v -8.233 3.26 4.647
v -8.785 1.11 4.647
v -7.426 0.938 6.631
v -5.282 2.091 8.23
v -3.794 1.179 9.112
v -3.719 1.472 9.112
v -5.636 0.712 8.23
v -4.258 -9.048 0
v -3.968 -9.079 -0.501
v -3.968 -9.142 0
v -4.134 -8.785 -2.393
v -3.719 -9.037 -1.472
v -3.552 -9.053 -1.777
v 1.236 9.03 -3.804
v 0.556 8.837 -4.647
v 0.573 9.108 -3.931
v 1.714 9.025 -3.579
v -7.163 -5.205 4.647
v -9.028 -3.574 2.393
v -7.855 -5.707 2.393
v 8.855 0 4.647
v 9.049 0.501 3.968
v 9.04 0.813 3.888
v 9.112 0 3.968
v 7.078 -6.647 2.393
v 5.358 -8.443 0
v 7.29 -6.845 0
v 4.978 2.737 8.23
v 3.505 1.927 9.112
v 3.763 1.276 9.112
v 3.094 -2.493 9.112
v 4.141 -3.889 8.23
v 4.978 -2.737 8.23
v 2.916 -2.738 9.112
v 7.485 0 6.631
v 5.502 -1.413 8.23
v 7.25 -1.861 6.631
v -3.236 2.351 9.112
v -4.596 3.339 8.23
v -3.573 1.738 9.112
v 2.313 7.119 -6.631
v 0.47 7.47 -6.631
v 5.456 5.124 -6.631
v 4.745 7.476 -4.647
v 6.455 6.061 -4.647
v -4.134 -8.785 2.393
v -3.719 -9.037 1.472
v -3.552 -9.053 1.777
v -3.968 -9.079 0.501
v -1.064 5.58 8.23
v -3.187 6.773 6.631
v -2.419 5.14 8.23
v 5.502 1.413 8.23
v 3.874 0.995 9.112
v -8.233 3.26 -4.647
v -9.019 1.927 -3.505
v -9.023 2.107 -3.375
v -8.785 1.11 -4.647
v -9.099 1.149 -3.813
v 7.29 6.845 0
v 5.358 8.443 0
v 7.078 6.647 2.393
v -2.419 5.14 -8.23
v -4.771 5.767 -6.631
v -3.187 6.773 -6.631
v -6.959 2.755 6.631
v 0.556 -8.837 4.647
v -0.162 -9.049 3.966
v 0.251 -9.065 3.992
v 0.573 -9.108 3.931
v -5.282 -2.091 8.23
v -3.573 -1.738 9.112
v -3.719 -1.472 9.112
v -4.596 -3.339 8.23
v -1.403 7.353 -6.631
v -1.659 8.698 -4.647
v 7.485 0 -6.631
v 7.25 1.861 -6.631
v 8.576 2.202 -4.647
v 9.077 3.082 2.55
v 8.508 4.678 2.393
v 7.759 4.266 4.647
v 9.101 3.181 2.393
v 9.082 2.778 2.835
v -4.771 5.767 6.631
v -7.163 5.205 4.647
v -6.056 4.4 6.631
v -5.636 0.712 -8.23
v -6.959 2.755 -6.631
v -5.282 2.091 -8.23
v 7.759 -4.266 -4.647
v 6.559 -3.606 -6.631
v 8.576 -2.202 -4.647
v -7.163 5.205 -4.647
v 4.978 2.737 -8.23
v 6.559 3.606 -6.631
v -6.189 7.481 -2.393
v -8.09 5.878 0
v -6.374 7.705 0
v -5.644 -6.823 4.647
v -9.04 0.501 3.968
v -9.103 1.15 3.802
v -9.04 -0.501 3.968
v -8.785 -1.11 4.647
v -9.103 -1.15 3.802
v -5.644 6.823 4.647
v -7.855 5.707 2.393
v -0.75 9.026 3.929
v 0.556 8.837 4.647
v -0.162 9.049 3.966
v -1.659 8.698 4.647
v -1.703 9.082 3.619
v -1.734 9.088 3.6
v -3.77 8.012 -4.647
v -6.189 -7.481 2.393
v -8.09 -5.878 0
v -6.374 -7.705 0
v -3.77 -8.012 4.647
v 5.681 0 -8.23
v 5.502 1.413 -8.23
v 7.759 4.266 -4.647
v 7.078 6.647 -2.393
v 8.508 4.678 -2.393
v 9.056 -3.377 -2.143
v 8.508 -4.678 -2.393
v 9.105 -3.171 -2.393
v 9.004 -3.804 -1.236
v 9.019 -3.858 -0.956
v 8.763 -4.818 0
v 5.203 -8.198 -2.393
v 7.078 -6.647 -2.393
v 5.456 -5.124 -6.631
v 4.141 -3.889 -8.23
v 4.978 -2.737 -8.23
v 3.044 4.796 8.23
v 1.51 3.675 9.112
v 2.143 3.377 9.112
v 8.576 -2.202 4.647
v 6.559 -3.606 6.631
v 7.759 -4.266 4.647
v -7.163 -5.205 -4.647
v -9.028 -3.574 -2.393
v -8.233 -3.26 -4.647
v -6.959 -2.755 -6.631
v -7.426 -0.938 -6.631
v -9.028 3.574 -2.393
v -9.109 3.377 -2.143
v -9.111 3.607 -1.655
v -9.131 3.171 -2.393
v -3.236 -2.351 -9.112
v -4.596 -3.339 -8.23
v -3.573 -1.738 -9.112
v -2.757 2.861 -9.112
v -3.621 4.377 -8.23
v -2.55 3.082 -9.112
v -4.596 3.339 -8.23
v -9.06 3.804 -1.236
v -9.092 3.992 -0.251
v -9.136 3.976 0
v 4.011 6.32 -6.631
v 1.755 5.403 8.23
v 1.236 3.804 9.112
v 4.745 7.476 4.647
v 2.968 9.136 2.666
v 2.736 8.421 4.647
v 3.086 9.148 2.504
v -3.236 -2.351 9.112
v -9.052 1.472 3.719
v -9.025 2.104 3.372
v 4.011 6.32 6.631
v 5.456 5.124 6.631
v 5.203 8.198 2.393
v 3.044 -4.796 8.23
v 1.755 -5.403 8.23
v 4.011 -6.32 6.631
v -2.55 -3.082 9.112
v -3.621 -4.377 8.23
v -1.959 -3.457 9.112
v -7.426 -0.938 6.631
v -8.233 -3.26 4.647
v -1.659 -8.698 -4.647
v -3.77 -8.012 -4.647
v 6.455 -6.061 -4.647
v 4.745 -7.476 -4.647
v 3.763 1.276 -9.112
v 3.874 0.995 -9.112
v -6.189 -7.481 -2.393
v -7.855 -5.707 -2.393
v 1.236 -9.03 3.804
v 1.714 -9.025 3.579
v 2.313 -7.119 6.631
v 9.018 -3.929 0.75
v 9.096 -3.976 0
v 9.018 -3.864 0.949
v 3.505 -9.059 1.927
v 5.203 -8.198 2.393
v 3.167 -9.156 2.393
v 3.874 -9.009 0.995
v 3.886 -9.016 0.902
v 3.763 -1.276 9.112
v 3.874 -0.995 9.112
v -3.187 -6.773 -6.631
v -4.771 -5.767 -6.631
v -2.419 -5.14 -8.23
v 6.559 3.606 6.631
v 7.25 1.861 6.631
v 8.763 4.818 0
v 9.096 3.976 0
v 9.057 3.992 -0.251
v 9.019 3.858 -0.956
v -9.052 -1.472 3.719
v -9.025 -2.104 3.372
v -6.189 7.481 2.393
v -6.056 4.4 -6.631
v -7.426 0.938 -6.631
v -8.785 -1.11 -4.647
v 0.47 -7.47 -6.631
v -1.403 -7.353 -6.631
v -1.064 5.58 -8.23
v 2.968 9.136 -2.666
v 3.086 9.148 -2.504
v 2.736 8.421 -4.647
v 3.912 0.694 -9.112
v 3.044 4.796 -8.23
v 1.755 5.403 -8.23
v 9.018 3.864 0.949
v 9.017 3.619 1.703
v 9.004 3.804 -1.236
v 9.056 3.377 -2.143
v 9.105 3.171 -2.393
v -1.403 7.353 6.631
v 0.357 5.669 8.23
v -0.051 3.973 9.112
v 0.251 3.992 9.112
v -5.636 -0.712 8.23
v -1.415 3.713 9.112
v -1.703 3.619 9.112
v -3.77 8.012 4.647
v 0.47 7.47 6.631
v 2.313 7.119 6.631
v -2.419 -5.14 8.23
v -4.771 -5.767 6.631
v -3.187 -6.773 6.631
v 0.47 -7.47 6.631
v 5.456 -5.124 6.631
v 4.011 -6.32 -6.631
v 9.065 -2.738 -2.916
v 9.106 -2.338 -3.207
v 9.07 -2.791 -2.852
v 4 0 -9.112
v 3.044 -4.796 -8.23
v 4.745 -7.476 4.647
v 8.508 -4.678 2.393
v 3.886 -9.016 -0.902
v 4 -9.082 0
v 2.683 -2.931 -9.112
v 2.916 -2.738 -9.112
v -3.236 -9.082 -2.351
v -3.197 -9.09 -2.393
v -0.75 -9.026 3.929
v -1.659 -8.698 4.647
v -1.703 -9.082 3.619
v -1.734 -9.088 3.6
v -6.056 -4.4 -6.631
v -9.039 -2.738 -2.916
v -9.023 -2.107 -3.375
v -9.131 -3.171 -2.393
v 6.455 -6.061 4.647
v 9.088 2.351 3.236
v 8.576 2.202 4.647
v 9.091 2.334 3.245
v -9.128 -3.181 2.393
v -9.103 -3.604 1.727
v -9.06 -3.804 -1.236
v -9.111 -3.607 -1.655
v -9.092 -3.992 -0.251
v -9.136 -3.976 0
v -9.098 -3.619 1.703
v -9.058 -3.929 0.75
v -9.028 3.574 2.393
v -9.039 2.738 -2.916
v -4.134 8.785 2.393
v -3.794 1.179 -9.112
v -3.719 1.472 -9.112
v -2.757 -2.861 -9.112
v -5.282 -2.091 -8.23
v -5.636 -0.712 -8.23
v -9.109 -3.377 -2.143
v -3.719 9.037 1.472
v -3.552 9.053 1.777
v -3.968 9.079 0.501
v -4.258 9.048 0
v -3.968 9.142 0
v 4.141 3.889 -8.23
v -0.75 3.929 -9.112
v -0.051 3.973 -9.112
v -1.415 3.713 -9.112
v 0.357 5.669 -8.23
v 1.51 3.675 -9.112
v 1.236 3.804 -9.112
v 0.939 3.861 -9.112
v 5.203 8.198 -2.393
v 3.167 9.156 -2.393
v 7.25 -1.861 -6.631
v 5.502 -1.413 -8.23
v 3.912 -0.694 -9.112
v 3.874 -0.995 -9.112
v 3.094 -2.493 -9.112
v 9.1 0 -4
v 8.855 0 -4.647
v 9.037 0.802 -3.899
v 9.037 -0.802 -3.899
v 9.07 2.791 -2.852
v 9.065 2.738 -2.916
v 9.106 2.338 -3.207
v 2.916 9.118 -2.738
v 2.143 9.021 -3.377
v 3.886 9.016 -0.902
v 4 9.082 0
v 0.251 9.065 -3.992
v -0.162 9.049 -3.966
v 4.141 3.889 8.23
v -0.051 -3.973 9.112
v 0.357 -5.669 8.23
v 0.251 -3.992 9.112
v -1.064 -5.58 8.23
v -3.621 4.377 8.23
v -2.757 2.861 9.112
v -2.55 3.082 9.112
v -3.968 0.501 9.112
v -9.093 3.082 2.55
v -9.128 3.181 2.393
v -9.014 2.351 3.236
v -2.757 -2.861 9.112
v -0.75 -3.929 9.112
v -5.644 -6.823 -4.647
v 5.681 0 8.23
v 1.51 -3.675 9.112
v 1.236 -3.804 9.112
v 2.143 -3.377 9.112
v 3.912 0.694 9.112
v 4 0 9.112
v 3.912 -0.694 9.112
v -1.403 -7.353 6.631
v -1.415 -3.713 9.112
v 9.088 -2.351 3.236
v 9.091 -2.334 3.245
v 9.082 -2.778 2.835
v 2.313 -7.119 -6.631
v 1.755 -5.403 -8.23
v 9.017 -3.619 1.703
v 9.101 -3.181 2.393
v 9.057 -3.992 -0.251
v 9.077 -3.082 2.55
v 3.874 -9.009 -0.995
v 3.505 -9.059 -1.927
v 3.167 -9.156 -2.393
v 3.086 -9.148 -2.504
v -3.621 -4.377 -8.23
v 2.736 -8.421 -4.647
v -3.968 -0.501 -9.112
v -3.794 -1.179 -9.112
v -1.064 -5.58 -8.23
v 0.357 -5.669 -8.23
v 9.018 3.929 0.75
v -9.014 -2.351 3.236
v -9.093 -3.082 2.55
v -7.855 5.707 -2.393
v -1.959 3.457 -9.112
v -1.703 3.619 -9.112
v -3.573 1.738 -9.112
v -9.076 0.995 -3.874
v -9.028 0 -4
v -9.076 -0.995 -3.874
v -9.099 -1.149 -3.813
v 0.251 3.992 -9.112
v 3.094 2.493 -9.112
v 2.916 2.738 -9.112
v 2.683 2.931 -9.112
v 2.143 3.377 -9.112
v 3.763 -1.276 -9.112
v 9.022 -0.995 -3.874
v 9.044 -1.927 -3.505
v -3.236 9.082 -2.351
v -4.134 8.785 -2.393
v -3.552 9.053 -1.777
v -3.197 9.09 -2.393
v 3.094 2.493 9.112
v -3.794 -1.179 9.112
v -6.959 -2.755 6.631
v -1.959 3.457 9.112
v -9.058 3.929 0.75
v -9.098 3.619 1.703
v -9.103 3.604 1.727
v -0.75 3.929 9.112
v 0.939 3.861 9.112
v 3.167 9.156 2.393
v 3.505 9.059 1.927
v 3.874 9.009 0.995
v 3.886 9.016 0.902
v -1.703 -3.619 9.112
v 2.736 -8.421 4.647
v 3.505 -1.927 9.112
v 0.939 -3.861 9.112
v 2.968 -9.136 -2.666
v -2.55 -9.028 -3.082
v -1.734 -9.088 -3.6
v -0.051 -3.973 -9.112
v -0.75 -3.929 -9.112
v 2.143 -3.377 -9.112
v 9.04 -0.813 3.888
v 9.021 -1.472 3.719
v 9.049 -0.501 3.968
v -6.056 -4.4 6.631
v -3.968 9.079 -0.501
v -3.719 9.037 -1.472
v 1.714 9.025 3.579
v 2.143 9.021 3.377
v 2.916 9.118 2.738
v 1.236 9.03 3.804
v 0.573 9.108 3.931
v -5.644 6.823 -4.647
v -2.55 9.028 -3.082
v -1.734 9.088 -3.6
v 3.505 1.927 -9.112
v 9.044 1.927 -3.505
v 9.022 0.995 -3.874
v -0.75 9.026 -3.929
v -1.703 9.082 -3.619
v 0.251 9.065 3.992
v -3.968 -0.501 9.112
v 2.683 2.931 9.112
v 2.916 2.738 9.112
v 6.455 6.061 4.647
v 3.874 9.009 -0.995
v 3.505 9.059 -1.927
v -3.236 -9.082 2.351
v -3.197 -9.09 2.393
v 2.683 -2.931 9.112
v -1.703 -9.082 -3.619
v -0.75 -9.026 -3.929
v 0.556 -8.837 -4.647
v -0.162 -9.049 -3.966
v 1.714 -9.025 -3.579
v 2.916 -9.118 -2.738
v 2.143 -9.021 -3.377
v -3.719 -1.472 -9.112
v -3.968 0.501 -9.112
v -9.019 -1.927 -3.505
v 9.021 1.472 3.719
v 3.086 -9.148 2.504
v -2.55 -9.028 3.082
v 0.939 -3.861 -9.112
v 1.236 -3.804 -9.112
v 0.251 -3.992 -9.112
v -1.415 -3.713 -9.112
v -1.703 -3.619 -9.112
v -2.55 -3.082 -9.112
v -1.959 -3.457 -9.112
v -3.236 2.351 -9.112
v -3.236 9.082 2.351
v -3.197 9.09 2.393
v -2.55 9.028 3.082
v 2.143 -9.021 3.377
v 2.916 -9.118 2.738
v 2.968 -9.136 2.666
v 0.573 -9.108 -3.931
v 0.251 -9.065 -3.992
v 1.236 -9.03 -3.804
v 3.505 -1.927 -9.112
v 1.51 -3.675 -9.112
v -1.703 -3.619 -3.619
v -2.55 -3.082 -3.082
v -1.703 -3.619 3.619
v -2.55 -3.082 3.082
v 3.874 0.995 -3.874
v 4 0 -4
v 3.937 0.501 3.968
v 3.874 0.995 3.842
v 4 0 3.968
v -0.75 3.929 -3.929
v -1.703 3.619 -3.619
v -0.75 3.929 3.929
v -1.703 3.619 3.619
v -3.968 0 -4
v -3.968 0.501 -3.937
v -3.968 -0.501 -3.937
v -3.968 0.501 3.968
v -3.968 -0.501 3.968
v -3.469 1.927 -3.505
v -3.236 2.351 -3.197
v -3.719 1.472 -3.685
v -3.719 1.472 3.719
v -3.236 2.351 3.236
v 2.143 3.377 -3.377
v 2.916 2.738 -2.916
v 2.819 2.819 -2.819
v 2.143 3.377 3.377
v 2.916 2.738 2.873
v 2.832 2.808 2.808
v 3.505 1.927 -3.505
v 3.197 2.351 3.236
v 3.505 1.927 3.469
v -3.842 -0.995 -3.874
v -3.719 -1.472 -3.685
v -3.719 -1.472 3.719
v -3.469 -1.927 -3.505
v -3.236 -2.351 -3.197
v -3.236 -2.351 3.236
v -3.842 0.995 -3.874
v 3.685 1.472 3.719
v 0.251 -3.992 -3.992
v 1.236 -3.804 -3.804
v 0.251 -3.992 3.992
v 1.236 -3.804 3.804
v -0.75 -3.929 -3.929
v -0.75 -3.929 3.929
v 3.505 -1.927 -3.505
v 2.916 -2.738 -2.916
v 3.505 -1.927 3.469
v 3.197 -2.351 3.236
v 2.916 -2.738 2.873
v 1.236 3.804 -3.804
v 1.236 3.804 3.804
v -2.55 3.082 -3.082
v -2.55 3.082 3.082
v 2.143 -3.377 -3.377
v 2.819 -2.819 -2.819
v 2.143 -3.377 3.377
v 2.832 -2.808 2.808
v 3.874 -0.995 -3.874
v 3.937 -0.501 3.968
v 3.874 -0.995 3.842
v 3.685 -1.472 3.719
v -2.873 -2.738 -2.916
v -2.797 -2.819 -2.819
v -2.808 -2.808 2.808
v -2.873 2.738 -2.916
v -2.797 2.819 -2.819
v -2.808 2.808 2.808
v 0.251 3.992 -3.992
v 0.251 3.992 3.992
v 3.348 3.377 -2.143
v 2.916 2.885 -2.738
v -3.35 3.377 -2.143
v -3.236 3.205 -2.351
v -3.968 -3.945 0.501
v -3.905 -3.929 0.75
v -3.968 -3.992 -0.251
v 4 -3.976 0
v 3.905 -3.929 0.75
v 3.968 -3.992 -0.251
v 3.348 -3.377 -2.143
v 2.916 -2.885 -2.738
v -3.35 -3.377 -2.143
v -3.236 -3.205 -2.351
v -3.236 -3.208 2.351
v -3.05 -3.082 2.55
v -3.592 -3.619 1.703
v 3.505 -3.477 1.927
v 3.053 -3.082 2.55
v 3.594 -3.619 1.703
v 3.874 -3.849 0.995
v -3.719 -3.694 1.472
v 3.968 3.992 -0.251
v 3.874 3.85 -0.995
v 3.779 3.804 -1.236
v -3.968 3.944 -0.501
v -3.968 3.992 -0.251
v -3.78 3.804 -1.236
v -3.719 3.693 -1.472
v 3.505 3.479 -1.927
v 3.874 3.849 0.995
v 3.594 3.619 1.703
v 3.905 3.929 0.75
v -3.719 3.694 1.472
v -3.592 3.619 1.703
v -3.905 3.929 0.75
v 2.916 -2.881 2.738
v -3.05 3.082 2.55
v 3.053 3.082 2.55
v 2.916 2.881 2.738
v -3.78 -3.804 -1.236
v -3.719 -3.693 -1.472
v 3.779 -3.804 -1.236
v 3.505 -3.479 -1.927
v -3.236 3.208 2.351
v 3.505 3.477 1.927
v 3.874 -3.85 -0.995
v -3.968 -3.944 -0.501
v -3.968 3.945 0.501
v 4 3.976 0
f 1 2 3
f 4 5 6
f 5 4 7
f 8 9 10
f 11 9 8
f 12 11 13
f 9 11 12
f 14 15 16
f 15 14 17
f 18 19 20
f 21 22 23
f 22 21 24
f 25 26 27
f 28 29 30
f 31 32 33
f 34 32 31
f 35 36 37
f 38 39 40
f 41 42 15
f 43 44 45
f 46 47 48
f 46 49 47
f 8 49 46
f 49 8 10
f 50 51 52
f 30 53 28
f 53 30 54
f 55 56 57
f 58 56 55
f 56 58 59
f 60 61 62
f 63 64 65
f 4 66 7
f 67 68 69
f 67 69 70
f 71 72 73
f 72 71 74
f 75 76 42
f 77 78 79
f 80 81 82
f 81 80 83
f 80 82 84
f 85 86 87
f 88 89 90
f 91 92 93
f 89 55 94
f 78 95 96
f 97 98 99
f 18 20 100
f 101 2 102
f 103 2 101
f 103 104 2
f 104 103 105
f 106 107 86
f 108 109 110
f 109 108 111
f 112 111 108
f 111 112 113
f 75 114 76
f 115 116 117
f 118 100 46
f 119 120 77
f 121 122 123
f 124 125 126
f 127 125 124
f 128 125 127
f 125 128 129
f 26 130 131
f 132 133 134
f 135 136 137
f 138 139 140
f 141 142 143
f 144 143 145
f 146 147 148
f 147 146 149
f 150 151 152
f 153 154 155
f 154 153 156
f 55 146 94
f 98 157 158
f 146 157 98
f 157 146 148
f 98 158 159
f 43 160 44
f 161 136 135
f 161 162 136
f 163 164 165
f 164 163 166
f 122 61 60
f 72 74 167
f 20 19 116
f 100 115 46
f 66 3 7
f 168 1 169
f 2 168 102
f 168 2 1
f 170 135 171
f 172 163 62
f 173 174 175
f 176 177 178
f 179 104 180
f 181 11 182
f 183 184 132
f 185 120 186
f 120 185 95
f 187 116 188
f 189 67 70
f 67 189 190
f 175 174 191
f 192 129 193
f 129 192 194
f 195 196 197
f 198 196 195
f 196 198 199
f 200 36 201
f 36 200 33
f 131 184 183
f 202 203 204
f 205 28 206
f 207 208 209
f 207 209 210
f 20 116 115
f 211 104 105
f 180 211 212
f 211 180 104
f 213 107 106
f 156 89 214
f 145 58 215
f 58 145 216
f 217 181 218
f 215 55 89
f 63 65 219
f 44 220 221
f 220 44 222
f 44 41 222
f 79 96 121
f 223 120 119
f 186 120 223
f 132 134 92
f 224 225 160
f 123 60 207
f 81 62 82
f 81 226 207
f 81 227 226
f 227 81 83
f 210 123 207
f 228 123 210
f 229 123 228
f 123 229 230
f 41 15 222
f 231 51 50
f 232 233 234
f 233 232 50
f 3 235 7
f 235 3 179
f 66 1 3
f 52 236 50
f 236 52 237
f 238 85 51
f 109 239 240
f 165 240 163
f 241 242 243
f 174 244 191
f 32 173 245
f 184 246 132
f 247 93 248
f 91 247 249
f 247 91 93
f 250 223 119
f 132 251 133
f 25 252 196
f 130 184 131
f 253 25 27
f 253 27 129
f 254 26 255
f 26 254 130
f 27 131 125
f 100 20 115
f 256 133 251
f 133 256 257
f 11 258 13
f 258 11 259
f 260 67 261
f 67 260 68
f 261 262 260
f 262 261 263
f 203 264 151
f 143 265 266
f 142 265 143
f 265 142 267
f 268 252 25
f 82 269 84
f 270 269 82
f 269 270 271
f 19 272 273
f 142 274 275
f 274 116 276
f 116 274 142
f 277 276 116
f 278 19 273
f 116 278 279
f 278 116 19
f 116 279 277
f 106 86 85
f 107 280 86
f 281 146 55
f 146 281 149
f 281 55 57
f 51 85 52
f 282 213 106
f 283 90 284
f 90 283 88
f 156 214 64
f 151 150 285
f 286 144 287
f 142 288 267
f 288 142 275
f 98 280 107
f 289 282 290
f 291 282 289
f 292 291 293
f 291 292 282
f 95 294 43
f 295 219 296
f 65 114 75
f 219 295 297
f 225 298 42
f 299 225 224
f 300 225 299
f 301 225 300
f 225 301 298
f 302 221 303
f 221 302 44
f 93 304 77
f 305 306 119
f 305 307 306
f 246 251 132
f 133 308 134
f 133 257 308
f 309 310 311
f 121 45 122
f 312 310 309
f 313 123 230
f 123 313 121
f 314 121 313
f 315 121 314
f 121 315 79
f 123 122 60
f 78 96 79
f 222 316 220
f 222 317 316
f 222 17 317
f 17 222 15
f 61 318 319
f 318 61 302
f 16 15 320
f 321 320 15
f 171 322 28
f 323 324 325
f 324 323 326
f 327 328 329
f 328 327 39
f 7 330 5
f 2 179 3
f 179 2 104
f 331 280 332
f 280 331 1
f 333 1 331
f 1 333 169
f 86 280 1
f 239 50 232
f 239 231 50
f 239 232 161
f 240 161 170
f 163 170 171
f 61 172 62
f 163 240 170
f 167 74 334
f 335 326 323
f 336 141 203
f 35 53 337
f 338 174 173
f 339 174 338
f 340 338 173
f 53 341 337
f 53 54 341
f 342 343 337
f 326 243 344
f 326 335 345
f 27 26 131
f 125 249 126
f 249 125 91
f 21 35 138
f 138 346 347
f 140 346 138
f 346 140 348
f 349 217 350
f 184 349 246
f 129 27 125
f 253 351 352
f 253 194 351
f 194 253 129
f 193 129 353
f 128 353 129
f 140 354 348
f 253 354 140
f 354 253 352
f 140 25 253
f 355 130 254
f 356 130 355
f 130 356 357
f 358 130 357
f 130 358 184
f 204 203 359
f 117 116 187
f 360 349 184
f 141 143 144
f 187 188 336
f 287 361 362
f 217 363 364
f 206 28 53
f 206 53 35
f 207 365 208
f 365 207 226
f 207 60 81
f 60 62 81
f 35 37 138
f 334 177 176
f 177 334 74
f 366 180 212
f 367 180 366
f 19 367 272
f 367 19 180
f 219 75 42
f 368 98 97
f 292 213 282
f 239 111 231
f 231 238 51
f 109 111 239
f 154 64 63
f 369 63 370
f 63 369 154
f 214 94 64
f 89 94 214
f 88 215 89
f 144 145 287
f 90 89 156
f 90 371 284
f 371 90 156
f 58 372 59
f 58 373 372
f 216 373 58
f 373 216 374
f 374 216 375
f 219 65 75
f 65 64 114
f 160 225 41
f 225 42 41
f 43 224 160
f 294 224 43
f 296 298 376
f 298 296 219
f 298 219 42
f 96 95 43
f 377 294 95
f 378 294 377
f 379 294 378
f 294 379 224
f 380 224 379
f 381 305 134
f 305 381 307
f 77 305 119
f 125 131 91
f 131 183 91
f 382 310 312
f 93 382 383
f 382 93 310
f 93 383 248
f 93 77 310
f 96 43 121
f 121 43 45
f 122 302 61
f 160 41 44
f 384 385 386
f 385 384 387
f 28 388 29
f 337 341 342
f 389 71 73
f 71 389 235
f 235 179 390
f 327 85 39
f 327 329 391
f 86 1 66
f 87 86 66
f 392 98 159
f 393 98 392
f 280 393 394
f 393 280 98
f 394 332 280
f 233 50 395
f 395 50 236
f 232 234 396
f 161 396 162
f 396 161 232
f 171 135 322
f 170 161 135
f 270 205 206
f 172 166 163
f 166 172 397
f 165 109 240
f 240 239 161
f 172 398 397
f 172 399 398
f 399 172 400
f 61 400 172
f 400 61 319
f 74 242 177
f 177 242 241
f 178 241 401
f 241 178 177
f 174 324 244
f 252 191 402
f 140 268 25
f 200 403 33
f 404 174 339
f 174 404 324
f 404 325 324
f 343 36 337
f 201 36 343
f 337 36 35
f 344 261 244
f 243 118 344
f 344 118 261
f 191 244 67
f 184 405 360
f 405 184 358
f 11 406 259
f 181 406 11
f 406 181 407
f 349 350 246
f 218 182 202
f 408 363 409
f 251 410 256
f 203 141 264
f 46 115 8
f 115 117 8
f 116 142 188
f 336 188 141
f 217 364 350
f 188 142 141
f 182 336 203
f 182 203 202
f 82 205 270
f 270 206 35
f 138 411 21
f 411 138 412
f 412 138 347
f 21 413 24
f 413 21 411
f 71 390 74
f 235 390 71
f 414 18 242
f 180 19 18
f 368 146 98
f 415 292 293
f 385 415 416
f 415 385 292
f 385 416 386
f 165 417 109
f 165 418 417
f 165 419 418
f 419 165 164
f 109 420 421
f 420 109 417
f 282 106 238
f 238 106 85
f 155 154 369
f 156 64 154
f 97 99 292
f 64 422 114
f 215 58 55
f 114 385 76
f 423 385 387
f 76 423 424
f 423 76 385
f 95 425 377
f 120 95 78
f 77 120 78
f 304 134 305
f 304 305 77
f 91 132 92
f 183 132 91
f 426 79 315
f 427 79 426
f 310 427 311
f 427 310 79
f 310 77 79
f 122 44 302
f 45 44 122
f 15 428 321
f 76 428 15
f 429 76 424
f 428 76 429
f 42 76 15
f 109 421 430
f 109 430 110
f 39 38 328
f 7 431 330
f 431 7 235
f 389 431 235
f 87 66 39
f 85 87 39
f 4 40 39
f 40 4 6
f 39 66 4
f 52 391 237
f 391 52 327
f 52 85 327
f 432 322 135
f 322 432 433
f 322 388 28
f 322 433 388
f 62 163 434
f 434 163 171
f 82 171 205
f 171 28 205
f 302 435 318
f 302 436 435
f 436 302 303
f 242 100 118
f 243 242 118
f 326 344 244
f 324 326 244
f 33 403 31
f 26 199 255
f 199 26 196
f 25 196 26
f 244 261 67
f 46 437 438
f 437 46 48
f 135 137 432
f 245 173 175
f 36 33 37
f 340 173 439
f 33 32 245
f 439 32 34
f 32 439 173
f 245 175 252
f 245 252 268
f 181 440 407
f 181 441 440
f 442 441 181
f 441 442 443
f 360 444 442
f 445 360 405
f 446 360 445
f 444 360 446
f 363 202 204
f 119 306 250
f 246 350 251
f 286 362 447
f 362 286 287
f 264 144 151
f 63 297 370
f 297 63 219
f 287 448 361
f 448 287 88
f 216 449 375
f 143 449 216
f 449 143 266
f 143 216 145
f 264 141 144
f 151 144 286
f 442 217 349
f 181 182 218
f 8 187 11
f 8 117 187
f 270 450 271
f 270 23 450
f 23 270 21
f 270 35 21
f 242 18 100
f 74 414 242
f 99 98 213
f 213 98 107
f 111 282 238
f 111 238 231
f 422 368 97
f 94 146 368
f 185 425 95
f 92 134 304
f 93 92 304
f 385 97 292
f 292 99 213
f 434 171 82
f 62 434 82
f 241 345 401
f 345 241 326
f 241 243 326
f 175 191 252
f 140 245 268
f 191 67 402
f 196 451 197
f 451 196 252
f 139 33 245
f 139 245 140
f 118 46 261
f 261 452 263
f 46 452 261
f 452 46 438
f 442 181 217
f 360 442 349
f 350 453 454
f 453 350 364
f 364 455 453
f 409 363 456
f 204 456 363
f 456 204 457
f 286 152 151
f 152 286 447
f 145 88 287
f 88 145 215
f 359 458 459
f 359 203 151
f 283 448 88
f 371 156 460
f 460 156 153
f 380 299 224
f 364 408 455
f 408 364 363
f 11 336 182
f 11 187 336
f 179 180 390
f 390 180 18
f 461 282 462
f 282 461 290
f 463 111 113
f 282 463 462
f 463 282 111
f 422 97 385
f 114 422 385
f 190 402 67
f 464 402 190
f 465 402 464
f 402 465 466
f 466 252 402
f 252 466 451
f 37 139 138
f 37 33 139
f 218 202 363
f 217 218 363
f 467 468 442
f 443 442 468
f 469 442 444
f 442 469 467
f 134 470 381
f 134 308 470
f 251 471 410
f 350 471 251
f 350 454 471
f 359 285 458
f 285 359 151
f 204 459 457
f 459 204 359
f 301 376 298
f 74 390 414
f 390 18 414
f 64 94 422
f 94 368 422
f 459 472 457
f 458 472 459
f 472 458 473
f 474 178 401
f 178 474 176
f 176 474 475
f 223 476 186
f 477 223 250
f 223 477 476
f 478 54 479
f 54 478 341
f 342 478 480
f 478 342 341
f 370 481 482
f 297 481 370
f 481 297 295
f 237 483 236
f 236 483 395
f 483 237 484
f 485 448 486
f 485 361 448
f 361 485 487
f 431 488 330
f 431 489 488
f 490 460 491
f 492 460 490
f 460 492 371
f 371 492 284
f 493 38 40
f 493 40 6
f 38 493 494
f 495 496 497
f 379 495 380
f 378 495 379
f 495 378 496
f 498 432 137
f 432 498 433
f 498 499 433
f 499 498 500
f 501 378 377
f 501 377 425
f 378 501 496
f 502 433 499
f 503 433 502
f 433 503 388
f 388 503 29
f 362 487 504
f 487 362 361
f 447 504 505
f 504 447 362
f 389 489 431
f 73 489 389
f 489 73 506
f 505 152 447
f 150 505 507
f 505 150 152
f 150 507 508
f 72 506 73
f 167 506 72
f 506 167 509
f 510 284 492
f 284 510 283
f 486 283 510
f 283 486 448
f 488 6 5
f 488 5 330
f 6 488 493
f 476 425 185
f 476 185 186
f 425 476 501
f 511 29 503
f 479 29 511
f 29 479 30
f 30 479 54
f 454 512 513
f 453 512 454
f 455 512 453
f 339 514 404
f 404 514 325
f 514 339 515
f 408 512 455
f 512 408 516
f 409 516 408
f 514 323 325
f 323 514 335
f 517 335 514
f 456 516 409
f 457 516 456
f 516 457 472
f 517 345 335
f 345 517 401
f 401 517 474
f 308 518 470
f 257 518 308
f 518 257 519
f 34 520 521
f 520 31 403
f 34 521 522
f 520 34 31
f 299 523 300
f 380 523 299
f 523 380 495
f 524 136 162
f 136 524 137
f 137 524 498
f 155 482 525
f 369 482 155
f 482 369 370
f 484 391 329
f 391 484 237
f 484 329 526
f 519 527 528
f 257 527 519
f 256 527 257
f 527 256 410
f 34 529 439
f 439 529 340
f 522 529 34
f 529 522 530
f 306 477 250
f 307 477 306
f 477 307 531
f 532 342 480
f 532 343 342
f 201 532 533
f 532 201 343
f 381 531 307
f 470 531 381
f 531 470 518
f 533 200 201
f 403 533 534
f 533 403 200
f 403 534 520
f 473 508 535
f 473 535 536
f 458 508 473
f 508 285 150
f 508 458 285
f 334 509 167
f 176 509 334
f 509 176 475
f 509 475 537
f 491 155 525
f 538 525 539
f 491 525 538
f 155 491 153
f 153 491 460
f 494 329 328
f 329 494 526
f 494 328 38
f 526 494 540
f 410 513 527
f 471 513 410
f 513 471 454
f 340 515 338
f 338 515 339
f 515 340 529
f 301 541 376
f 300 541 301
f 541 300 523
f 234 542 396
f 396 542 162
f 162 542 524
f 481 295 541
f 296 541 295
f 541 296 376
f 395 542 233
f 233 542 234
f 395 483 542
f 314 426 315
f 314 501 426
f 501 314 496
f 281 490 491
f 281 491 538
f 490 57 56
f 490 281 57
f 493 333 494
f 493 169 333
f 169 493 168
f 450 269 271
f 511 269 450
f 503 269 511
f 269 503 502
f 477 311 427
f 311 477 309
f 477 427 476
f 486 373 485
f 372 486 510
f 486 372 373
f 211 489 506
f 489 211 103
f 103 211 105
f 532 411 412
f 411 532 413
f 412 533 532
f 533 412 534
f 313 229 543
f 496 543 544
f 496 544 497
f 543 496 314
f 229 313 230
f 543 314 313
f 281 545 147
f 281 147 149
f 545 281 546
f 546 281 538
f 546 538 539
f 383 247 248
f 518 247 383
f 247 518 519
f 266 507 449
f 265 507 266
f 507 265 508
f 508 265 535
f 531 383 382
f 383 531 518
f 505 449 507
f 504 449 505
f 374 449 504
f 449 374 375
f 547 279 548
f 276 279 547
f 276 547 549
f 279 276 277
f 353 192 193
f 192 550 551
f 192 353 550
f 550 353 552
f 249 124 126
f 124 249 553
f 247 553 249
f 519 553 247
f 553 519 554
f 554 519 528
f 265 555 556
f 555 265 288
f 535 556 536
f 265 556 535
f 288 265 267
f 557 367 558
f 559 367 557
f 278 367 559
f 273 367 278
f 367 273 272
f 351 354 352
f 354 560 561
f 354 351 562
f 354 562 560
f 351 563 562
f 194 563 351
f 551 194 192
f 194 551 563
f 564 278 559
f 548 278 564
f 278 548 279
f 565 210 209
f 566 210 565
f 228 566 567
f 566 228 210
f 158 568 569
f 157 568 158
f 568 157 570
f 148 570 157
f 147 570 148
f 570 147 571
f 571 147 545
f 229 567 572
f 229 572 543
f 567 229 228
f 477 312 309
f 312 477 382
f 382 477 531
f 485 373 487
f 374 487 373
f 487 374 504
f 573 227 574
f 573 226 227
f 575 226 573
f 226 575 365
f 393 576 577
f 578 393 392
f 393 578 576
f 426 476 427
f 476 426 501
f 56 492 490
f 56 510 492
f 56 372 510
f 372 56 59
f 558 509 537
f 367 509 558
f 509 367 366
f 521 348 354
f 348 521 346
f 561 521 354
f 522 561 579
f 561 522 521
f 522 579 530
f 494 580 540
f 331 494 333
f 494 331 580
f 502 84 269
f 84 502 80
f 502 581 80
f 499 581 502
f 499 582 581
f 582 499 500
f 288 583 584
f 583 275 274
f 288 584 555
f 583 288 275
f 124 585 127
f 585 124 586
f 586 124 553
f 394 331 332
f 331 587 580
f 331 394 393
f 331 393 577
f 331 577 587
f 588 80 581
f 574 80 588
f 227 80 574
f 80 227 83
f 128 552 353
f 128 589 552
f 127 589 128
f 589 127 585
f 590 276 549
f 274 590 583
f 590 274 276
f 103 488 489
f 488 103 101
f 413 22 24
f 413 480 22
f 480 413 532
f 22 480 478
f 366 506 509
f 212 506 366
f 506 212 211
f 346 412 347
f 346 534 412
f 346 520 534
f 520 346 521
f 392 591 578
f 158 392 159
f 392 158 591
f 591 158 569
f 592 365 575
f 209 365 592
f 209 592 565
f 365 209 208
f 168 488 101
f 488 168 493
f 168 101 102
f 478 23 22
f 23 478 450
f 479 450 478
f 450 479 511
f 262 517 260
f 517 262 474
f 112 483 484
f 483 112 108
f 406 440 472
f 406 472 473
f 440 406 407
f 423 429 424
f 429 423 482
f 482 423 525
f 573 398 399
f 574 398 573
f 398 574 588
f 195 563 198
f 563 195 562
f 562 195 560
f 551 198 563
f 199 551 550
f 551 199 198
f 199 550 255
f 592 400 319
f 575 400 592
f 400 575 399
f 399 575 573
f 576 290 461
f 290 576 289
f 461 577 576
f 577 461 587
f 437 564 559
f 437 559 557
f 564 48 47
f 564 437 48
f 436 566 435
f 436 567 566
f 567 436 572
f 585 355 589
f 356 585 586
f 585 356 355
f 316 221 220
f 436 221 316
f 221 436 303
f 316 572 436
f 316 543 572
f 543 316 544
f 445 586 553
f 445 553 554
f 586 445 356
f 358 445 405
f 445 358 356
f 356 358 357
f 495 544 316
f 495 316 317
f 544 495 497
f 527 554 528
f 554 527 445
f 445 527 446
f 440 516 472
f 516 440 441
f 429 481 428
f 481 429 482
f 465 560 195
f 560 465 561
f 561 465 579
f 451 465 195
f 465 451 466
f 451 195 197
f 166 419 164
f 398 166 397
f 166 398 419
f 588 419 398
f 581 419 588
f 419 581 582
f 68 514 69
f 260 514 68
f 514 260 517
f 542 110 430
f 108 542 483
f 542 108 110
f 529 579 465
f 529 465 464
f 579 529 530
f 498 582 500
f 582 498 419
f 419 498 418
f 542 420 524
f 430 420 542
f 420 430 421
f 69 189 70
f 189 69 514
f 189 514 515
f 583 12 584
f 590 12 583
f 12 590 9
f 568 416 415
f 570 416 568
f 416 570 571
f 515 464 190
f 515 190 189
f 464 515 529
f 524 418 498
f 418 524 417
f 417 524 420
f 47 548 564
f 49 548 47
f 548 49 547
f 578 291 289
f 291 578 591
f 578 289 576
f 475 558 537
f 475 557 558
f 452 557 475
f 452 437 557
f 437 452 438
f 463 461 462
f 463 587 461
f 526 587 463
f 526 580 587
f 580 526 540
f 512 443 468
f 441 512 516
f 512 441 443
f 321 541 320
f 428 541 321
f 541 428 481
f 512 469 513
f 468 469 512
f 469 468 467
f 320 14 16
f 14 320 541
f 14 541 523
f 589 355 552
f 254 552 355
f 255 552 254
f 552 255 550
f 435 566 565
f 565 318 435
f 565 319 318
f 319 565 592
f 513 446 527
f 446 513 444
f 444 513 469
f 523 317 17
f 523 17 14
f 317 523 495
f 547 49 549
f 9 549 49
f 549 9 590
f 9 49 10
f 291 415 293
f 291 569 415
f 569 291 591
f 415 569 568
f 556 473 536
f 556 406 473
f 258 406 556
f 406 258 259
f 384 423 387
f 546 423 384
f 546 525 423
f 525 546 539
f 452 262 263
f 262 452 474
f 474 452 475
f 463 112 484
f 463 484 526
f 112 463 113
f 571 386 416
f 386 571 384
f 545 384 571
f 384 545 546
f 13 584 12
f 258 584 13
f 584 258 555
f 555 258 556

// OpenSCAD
$fn=25;
difference() {
  sphere(r=10);
  cylinder(h=20, r1=4, r2=4, center=true);
  rotate([0, 90, 0]) {
    cylinder(r=4, h=20, center=true);
  }
  rotate([90, 0, 0]) {
    #cylinder(r=4, h=25, center=true);
  }
}
